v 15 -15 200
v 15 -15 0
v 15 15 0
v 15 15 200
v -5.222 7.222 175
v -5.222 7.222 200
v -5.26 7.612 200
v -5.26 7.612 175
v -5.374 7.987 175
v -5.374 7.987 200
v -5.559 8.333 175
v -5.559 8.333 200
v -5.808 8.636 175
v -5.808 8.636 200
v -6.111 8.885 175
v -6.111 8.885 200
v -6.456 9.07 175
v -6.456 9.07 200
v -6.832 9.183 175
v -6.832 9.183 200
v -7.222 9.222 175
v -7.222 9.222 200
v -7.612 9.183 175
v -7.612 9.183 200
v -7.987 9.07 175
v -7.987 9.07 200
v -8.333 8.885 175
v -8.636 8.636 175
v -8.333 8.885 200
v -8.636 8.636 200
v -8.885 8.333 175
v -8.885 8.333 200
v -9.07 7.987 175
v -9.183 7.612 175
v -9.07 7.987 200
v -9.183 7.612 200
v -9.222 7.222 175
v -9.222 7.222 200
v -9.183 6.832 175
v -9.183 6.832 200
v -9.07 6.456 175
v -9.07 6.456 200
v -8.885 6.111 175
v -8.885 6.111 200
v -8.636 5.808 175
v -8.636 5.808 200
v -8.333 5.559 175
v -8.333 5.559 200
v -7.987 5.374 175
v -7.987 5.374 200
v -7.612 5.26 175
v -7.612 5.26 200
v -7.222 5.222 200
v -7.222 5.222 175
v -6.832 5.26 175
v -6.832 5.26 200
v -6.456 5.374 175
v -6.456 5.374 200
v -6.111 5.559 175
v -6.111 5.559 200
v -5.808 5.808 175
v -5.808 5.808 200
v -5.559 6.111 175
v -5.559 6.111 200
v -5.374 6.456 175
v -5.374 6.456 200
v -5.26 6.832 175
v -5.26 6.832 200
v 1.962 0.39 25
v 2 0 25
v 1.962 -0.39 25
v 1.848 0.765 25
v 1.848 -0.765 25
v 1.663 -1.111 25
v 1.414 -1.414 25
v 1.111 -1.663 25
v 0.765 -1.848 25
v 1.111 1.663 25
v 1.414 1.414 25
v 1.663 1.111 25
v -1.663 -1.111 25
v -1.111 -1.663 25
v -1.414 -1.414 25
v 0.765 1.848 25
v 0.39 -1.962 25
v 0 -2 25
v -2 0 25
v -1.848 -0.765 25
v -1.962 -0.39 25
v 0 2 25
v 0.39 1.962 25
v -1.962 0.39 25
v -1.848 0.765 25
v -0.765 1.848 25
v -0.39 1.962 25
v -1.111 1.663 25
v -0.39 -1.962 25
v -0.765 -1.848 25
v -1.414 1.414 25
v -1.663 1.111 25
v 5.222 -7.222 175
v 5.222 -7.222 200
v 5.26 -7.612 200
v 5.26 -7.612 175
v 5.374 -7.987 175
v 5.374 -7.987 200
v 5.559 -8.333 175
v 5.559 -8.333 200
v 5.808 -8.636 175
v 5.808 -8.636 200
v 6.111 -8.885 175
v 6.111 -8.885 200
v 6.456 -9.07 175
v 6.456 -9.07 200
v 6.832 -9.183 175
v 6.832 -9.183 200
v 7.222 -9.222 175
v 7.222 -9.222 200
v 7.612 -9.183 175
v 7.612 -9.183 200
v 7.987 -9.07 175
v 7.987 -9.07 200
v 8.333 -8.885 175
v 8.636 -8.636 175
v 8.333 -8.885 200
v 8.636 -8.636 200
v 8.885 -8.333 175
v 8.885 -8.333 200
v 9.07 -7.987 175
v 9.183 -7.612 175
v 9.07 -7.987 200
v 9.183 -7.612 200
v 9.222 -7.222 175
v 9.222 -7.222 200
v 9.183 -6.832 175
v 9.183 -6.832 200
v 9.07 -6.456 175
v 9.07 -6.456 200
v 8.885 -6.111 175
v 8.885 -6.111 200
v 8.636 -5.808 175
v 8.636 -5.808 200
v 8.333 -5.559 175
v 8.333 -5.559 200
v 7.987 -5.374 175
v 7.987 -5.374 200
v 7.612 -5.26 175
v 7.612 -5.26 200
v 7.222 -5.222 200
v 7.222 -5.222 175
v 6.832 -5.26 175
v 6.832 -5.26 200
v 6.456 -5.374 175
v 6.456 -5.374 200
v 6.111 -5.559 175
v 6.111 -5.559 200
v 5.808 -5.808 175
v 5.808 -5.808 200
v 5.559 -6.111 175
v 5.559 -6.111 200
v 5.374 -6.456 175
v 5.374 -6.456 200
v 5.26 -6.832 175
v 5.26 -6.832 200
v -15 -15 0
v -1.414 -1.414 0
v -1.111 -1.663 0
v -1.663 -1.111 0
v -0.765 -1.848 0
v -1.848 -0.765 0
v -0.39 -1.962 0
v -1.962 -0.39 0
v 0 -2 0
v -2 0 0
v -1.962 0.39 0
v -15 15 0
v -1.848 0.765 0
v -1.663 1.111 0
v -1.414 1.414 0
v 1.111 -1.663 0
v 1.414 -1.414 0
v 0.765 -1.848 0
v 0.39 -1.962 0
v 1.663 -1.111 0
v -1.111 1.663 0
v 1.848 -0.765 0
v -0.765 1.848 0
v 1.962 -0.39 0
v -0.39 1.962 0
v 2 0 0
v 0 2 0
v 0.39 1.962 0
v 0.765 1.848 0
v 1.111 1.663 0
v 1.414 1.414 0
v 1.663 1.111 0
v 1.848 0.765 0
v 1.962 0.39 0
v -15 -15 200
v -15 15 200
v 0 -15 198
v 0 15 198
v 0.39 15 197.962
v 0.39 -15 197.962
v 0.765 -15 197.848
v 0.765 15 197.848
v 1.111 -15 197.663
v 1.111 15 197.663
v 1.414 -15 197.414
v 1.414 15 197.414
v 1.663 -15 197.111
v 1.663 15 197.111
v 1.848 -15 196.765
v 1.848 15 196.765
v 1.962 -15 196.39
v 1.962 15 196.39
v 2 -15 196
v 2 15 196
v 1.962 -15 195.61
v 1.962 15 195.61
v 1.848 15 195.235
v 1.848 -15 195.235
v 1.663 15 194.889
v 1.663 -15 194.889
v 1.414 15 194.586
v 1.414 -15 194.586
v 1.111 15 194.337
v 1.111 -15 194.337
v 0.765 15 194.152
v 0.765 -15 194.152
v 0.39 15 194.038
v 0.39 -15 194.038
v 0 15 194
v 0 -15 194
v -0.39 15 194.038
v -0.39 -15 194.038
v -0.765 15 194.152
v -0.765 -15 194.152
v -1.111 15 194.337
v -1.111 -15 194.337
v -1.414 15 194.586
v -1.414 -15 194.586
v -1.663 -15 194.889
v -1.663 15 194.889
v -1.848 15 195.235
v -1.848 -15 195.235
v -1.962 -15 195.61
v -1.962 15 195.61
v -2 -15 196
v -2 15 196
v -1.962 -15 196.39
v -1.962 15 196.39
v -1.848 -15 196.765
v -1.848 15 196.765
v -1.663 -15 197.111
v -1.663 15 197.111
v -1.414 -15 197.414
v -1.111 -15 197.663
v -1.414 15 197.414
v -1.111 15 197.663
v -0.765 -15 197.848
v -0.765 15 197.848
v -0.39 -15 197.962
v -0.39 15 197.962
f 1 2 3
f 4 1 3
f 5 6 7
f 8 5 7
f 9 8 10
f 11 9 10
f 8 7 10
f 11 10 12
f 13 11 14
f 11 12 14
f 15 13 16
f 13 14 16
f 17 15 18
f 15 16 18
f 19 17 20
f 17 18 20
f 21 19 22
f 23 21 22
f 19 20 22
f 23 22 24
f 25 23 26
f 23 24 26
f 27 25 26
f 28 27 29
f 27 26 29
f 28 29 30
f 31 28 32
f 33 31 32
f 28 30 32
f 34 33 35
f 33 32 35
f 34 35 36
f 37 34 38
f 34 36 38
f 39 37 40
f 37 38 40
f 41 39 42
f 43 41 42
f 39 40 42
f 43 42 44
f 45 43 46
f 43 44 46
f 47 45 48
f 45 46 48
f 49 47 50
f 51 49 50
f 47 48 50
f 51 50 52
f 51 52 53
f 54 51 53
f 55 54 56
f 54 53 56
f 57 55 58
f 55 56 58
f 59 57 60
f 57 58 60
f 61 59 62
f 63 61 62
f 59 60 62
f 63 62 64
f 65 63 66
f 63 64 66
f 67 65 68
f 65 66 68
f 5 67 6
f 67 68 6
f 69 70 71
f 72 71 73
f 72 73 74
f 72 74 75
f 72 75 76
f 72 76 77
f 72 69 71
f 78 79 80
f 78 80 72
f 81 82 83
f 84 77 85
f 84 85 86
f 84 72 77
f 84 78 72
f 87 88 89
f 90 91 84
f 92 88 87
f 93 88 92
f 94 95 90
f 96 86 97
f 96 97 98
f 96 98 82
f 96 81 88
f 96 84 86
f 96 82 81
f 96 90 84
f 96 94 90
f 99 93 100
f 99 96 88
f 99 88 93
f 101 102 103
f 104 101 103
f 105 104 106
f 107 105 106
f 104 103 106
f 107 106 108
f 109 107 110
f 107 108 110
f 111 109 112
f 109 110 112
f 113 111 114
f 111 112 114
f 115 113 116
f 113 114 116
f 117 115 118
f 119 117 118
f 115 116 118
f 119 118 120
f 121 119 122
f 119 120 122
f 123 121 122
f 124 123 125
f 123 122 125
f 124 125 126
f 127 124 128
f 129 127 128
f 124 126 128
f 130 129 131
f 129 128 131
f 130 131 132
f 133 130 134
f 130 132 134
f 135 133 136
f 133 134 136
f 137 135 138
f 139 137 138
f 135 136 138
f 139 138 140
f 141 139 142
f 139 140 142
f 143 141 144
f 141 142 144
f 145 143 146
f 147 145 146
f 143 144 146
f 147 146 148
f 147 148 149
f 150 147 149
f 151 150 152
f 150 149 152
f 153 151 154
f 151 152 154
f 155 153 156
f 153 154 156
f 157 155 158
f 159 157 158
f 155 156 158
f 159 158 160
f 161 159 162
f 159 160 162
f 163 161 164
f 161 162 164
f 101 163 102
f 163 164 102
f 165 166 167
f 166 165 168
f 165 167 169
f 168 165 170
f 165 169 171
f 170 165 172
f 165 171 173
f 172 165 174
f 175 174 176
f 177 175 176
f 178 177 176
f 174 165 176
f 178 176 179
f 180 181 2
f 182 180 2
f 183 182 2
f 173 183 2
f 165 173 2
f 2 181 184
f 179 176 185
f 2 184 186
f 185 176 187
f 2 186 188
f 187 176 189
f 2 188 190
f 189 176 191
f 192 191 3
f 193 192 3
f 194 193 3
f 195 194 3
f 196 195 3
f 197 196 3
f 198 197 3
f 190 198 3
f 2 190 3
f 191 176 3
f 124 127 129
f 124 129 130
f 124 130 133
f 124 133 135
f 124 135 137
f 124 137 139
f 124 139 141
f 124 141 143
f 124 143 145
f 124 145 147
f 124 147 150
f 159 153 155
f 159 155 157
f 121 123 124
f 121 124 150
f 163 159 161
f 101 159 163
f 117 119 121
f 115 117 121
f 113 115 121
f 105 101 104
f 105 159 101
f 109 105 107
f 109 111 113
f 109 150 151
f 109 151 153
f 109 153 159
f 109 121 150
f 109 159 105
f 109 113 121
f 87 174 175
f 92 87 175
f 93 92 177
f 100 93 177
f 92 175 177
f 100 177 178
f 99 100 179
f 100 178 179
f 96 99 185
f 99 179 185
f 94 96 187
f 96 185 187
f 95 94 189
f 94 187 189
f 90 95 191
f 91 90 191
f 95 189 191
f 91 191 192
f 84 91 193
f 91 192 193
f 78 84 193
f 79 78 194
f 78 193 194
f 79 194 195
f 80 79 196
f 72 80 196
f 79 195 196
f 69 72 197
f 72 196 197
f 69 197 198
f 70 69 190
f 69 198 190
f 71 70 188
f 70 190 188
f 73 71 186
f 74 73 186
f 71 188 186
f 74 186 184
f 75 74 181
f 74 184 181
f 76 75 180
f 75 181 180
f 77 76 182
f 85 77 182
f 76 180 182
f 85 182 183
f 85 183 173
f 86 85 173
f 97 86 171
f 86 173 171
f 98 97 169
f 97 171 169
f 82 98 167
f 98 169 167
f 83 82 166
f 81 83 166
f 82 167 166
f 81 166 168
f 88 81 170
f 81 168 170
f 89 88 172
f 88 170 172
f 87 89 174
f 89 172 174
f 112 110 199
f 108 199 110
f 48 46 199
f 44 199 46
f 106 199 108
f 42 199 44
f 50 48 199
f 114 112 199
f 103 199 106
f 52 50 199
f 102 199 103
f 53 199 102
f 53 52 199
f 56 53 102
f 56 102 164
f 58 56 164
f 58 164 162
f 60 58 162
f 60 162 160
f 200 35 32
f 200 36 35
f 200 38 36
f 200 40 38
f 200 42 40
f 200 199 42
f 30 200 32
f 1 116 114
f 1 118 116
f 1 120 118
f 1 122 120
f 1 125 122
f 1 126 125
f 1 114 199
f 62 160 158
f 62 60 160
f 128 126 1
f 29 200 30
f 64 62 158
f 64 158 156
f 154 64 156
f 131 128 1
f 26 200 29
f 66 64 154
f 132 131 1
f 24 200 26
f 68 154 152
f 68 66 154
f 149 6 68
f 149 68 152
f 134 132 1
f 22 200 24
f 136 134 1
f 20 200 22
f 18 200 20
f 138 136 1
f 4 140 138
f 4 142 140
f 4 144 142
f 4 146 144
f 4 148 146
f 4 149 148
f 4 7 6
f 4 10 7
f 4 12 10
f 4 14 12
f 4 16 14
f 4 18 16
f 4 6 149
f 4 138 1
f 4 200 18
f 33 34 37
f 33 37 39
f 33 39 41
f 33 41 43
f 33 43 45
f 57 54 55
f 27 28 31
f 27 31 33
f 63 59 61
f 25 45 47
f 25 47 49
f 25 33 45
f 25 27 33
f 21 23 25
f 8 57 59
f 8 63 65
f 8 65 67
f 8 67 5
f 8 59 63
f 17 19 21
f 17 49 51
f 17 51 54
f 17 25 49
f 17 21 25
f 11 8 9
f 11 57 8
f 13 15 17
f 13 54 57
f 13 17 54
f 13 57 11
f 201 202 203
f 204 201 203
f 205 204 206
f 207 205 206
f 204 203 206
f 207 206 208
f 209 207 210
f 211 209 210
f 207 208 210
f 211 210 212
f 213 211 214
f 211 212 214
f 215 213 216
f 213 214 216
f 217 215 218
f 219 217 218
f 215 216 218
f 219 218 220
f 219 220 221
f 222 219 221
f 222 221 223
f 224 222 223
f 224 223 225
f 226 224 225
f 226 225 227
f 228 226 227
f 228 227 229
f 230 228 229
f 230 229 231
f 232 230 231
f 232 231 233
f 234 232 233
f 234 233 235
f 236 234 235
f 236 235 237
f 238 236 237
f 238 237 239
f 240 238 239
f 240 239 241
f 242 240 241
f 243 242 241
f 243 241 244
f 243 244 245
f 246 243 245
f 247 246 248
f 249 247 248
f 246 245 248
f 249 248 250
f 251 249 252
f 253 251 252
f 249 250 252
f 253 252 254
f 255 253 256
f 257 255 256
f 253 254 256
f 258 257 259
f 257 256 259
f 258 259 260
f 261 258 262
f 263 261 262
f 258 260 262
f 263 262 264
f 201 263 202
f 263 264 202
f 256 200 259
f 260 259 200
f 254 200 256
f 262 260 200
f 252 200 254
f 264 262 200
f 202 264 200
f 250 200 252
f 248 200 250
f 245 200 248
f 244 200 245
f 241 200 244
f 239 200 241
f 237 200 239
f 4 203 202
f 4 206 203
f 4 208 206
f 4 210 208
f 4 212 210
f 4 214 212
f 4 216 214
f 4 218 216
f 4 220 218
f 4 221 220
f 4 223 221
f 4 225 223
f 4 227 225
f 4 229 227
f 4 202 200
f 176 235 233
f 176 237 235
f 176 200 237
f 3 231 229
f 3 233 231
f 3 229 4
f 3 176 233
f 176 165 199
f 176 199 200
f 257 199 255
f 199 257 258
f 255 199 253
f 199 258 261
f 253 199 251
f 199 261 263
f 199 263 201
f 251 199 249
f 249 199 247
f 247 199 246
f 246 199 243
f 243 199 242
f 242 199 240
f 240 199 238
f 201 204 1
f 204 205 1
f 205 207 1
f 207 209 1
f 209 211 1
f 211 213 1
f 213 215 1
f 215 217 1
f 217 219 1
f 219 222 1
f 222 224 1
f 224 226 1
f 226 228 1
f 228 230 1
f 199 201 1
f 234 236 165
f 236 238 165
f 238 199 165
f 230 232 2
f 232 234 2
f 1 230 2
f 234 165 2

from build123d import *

# Parameters (mm, degrees)
CROQUIS1_W              = 30
CROQUIS1_H              = 30
SALIENTE_EXTRUIR1_DEPTH = 200
CROQUIS2_R              = 2
CORTAR_EXTRUIR1_DEPTH   = 25
CROQUIS3_R              = 2
CORTAR_EXTRUIR2_DEPTH   = 203.792997907
CROQUIS4_R              = 2
CORTAR_EXTRUIR3_DEPTH   = 25


with BuildPart() as part:
    # Croquis1 → Saliente-Extruir1 (new body)
    with BuildSketch(Plane.XY):
        Rectangle(CROQUIS1_W, CROQUIS1_H)
    extrude(amount=SALIENTE_EXTRUIR1_DEPTH)

    # Croquis2 → Cortar-Extruir1 (cut)
    with BuildSketch(Plane.XY.offset(200)):
        with Locations((-7.221825407, 7.221825407)):
            Circle(CROQUIS2_R)
        with Locations(Location((7.221825407, -7.221825407, 0), (0, 0, 180))):
            Circle(CROQUIS2_R)
    extrude(amount=-CORTAR_EXTRUIR1_DEPTH, mode=Mode.SUBTRACT)

    # Croquis3 → Cortar-Extruir2 (cut, through all)
    with BuildSketch(Plane(origin=(0, 15, 0), x_dir=(1, 0, 0), z_dir=(0, 1, 0))):
        with Locations(Location((0, -196, 0), (0, 0, 270))):
            Circle(CROQUIS3_R)
    extrude(amount=-CORTAR_EXTRUIR2_DEPTH, mode=Mode.SUBTRACT)

    # Croquis4 → Cortar-Extruir3 (cut)
    with BuildSketch(Plane(origin=(0, 0, 0), x_dir=(-1, 0, 0), z_dir=(0, 0, -1))):
        Circle(CROQUIS4_R)
    extrude(amount=-CORTAR_EXTRUIR3_DEPTH, mode=Mode.SUBTRACT)


solid = part.part
